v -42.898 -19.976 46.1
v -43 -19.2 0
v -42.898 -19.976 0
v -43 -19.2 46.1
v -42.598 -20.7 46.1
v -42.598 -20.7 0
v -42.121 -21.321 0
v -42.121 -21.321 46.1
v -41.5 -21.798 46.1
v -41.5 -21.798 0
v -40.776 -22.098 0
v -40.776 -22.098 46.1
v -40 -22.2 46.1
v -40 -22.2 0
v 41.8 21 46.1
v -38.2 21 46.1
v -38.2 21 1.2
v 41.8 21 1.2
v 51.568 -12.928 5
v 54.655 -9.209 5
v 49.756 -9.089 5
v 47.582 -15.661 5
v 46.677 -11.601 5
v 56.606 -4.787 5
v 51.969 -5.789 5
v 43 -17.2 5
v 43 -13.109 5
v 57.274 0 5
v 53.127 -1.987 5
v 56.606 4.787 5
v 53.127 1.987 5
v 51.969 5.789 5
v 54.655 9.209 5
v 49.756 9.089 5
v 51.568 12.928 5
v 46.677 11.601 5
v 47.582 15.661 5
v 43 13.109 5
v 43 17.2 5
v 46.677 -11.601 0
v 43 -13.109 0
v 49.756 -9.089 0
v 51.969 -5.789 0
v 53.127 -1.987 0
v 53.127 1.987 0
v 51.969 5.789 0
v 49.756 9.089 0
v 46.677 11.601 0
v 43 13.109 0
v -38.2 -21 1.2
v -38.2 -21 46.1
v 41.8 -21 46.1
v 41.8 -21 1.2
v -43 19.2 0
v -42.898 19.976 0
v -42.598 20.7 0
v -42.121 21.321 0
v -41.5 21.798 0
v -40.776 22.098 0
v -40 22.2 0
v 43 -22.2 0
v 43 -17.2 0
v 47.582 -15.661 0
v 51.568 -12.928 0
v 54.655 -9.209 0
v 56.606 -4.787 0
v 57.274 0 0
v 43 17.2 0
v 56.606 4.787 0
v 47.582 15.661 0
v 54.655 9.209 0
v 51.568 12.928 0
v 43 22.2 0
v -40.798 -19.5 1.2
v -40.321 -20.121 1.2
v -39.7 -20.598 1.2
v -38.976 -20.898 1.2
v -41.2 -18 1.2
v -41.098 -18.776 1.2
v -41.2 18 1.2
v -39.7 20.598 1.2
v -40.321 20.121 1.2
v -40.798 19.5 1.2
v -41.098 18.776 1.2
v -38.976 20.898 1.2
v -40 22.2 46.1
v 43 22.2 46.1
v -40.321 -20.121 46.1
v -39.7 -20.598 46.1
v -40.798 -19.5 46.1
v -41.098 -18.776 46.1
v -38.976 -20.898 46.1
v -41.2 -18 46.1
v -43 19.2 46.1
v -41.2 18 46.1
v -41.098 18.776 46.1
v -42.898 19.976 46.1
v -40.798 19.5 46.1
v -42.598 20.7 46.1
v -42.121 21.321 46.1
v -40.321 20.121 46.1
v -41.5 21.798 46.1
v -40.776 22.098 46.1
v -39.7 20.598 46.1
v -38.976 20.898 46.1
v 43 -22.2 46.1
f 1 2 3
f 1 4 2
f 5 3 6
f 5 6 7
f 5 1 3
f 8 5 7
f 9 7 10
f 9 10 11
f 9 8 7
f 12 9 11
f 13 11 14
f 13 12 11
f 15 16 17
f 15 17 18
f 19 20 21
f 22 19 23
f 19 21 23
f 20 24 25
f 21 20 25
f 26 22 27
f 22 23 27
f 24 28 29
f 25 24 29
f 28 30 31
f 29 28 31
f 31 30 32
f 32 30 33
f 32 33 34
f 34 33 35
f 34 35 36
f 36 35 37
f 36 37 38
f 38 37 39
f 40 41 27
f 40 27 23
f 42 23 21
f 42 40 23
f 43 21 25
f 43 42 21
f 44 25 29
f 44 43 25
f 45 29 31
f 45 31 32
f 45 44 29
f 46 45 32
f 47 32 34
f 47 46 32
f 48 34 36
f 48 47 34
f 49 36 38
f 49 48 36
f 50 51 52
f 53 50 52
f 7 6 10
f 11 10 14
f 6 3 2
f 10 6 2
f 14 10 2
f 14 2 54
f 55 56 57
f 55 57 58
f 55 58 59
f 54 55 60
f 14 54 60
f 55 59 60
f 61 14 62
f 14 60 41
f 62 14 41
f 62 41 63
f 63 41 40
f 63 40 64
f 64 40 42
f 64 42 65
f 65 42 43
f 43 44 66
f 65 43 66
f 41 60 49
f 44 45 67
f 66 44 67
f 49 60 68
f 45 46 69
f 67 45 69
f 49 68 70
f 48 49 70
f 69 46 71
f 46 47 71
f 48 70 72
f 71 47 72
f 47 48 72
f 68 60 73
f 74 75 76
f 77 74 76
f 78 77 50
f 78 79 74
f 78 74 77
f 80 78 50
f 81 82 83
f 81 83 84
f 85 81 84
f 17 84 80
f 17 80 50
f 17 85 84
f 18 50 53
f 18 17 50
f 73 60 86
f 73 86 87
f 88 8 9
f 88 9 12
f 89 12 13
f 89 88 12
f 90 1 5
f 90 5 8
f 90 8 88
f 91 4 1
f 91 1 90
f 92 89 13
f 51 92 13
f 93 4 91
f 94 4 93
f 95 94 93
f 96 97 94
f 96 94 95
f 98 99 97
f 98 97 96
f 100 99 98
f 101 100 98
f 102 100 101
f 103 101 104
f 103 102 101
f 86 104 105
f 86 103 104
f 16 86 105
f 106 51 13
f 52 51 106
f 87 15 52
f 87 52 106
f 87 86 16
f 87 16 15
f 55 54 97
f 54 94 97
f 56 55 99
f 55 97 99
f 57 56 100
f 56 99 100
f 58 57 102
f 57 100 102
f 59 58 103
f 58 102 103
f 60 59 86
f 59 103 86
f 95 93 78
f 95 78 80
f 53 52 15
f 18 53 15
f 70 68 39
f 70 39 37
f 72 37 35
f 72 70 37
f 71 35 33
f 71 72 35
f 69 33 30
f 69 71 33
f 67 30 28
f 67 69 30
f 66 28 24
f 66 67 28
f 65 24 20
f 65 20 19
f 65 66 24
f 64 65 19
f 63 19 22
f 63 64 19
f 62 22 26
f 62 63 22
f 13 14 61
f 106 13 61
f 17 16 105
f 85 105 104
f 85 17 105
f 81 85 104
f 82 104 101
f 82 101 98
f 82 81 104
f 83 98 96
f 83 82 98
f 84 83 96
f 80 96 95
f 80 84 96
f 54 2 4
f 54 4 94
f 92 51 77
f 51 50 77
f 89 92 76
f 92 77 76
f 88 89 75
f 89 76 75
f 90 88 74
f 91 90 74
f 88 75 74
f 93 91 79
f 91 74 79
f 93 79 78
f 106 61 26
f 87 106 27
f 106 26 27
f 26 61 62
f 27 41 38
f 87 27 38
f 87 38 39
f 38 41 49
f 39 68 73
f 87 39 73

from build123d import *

# Parameters (mm, degrees)
SKETCH_1_W          = 86
SKETCH_1_H          = 44.4
EXTRUDE_1_DEPTH     = 46.1
EXTRUDE_2_DEPTH     = 5
SKETCH_3_W          = 83
SKETCH_3_H          = 42
CUT_EXTRUDE_1_DEPTH = 44.9
FILLET_1_R          = 3


with BuildPart() as part:
    # Эскиз1 → Бобышка-Вытянуть1 (new body)
    with BuildSketch(Plane.XY):
        Rectangle(SKETCH_1_W, SKETCH_1_H)
    extrude(amount=EXTRUDE_1_DEPTH)

    # Эскиз2 → Бобышка-Вытянуть2 (add)
    with BuildSketch(Plane.XY):
        with BuildLine():
            Line((43, 13.108775687), (43, 17.2))
            ThreePointArc((43, 17.2), (57.273546839, 0), (43, -17.2))
            Line((43, -17.2), (43, -13.108775687))
            ThreePointArc((43, -13.108775687), (53.273546839, 0), (43, 13.108775687))
        make_face()
    extrude(amount=EXTRUDE_2_DEPTH)

    # Эскиз3 → Вырез-Вытянуть1 (cut)
    with BuildSketch(Plane.XY.offset(46.1)):
        with Locations((0.3, 0)):
            Rectangle(SKETCH_3_W, SKETCH_3_H)
    extrude(amount=-CUT_EXTRUDE_1_DEPTH, mode=Mode.SUBTRACT)

    # Скругление1
    fillet_1_edges = [part.edges().sort_by_distance(p)[0] for p in [
        (-41.2, 21, 23.65),
        (-41.2, -21, 23.65),
        (-43, -22.2, 23.05),
        (-43, 22.2, 23.05),
    ]]
    fillet(fillet_1_edges, radius=FILLET_1_R)


solid = part.part
